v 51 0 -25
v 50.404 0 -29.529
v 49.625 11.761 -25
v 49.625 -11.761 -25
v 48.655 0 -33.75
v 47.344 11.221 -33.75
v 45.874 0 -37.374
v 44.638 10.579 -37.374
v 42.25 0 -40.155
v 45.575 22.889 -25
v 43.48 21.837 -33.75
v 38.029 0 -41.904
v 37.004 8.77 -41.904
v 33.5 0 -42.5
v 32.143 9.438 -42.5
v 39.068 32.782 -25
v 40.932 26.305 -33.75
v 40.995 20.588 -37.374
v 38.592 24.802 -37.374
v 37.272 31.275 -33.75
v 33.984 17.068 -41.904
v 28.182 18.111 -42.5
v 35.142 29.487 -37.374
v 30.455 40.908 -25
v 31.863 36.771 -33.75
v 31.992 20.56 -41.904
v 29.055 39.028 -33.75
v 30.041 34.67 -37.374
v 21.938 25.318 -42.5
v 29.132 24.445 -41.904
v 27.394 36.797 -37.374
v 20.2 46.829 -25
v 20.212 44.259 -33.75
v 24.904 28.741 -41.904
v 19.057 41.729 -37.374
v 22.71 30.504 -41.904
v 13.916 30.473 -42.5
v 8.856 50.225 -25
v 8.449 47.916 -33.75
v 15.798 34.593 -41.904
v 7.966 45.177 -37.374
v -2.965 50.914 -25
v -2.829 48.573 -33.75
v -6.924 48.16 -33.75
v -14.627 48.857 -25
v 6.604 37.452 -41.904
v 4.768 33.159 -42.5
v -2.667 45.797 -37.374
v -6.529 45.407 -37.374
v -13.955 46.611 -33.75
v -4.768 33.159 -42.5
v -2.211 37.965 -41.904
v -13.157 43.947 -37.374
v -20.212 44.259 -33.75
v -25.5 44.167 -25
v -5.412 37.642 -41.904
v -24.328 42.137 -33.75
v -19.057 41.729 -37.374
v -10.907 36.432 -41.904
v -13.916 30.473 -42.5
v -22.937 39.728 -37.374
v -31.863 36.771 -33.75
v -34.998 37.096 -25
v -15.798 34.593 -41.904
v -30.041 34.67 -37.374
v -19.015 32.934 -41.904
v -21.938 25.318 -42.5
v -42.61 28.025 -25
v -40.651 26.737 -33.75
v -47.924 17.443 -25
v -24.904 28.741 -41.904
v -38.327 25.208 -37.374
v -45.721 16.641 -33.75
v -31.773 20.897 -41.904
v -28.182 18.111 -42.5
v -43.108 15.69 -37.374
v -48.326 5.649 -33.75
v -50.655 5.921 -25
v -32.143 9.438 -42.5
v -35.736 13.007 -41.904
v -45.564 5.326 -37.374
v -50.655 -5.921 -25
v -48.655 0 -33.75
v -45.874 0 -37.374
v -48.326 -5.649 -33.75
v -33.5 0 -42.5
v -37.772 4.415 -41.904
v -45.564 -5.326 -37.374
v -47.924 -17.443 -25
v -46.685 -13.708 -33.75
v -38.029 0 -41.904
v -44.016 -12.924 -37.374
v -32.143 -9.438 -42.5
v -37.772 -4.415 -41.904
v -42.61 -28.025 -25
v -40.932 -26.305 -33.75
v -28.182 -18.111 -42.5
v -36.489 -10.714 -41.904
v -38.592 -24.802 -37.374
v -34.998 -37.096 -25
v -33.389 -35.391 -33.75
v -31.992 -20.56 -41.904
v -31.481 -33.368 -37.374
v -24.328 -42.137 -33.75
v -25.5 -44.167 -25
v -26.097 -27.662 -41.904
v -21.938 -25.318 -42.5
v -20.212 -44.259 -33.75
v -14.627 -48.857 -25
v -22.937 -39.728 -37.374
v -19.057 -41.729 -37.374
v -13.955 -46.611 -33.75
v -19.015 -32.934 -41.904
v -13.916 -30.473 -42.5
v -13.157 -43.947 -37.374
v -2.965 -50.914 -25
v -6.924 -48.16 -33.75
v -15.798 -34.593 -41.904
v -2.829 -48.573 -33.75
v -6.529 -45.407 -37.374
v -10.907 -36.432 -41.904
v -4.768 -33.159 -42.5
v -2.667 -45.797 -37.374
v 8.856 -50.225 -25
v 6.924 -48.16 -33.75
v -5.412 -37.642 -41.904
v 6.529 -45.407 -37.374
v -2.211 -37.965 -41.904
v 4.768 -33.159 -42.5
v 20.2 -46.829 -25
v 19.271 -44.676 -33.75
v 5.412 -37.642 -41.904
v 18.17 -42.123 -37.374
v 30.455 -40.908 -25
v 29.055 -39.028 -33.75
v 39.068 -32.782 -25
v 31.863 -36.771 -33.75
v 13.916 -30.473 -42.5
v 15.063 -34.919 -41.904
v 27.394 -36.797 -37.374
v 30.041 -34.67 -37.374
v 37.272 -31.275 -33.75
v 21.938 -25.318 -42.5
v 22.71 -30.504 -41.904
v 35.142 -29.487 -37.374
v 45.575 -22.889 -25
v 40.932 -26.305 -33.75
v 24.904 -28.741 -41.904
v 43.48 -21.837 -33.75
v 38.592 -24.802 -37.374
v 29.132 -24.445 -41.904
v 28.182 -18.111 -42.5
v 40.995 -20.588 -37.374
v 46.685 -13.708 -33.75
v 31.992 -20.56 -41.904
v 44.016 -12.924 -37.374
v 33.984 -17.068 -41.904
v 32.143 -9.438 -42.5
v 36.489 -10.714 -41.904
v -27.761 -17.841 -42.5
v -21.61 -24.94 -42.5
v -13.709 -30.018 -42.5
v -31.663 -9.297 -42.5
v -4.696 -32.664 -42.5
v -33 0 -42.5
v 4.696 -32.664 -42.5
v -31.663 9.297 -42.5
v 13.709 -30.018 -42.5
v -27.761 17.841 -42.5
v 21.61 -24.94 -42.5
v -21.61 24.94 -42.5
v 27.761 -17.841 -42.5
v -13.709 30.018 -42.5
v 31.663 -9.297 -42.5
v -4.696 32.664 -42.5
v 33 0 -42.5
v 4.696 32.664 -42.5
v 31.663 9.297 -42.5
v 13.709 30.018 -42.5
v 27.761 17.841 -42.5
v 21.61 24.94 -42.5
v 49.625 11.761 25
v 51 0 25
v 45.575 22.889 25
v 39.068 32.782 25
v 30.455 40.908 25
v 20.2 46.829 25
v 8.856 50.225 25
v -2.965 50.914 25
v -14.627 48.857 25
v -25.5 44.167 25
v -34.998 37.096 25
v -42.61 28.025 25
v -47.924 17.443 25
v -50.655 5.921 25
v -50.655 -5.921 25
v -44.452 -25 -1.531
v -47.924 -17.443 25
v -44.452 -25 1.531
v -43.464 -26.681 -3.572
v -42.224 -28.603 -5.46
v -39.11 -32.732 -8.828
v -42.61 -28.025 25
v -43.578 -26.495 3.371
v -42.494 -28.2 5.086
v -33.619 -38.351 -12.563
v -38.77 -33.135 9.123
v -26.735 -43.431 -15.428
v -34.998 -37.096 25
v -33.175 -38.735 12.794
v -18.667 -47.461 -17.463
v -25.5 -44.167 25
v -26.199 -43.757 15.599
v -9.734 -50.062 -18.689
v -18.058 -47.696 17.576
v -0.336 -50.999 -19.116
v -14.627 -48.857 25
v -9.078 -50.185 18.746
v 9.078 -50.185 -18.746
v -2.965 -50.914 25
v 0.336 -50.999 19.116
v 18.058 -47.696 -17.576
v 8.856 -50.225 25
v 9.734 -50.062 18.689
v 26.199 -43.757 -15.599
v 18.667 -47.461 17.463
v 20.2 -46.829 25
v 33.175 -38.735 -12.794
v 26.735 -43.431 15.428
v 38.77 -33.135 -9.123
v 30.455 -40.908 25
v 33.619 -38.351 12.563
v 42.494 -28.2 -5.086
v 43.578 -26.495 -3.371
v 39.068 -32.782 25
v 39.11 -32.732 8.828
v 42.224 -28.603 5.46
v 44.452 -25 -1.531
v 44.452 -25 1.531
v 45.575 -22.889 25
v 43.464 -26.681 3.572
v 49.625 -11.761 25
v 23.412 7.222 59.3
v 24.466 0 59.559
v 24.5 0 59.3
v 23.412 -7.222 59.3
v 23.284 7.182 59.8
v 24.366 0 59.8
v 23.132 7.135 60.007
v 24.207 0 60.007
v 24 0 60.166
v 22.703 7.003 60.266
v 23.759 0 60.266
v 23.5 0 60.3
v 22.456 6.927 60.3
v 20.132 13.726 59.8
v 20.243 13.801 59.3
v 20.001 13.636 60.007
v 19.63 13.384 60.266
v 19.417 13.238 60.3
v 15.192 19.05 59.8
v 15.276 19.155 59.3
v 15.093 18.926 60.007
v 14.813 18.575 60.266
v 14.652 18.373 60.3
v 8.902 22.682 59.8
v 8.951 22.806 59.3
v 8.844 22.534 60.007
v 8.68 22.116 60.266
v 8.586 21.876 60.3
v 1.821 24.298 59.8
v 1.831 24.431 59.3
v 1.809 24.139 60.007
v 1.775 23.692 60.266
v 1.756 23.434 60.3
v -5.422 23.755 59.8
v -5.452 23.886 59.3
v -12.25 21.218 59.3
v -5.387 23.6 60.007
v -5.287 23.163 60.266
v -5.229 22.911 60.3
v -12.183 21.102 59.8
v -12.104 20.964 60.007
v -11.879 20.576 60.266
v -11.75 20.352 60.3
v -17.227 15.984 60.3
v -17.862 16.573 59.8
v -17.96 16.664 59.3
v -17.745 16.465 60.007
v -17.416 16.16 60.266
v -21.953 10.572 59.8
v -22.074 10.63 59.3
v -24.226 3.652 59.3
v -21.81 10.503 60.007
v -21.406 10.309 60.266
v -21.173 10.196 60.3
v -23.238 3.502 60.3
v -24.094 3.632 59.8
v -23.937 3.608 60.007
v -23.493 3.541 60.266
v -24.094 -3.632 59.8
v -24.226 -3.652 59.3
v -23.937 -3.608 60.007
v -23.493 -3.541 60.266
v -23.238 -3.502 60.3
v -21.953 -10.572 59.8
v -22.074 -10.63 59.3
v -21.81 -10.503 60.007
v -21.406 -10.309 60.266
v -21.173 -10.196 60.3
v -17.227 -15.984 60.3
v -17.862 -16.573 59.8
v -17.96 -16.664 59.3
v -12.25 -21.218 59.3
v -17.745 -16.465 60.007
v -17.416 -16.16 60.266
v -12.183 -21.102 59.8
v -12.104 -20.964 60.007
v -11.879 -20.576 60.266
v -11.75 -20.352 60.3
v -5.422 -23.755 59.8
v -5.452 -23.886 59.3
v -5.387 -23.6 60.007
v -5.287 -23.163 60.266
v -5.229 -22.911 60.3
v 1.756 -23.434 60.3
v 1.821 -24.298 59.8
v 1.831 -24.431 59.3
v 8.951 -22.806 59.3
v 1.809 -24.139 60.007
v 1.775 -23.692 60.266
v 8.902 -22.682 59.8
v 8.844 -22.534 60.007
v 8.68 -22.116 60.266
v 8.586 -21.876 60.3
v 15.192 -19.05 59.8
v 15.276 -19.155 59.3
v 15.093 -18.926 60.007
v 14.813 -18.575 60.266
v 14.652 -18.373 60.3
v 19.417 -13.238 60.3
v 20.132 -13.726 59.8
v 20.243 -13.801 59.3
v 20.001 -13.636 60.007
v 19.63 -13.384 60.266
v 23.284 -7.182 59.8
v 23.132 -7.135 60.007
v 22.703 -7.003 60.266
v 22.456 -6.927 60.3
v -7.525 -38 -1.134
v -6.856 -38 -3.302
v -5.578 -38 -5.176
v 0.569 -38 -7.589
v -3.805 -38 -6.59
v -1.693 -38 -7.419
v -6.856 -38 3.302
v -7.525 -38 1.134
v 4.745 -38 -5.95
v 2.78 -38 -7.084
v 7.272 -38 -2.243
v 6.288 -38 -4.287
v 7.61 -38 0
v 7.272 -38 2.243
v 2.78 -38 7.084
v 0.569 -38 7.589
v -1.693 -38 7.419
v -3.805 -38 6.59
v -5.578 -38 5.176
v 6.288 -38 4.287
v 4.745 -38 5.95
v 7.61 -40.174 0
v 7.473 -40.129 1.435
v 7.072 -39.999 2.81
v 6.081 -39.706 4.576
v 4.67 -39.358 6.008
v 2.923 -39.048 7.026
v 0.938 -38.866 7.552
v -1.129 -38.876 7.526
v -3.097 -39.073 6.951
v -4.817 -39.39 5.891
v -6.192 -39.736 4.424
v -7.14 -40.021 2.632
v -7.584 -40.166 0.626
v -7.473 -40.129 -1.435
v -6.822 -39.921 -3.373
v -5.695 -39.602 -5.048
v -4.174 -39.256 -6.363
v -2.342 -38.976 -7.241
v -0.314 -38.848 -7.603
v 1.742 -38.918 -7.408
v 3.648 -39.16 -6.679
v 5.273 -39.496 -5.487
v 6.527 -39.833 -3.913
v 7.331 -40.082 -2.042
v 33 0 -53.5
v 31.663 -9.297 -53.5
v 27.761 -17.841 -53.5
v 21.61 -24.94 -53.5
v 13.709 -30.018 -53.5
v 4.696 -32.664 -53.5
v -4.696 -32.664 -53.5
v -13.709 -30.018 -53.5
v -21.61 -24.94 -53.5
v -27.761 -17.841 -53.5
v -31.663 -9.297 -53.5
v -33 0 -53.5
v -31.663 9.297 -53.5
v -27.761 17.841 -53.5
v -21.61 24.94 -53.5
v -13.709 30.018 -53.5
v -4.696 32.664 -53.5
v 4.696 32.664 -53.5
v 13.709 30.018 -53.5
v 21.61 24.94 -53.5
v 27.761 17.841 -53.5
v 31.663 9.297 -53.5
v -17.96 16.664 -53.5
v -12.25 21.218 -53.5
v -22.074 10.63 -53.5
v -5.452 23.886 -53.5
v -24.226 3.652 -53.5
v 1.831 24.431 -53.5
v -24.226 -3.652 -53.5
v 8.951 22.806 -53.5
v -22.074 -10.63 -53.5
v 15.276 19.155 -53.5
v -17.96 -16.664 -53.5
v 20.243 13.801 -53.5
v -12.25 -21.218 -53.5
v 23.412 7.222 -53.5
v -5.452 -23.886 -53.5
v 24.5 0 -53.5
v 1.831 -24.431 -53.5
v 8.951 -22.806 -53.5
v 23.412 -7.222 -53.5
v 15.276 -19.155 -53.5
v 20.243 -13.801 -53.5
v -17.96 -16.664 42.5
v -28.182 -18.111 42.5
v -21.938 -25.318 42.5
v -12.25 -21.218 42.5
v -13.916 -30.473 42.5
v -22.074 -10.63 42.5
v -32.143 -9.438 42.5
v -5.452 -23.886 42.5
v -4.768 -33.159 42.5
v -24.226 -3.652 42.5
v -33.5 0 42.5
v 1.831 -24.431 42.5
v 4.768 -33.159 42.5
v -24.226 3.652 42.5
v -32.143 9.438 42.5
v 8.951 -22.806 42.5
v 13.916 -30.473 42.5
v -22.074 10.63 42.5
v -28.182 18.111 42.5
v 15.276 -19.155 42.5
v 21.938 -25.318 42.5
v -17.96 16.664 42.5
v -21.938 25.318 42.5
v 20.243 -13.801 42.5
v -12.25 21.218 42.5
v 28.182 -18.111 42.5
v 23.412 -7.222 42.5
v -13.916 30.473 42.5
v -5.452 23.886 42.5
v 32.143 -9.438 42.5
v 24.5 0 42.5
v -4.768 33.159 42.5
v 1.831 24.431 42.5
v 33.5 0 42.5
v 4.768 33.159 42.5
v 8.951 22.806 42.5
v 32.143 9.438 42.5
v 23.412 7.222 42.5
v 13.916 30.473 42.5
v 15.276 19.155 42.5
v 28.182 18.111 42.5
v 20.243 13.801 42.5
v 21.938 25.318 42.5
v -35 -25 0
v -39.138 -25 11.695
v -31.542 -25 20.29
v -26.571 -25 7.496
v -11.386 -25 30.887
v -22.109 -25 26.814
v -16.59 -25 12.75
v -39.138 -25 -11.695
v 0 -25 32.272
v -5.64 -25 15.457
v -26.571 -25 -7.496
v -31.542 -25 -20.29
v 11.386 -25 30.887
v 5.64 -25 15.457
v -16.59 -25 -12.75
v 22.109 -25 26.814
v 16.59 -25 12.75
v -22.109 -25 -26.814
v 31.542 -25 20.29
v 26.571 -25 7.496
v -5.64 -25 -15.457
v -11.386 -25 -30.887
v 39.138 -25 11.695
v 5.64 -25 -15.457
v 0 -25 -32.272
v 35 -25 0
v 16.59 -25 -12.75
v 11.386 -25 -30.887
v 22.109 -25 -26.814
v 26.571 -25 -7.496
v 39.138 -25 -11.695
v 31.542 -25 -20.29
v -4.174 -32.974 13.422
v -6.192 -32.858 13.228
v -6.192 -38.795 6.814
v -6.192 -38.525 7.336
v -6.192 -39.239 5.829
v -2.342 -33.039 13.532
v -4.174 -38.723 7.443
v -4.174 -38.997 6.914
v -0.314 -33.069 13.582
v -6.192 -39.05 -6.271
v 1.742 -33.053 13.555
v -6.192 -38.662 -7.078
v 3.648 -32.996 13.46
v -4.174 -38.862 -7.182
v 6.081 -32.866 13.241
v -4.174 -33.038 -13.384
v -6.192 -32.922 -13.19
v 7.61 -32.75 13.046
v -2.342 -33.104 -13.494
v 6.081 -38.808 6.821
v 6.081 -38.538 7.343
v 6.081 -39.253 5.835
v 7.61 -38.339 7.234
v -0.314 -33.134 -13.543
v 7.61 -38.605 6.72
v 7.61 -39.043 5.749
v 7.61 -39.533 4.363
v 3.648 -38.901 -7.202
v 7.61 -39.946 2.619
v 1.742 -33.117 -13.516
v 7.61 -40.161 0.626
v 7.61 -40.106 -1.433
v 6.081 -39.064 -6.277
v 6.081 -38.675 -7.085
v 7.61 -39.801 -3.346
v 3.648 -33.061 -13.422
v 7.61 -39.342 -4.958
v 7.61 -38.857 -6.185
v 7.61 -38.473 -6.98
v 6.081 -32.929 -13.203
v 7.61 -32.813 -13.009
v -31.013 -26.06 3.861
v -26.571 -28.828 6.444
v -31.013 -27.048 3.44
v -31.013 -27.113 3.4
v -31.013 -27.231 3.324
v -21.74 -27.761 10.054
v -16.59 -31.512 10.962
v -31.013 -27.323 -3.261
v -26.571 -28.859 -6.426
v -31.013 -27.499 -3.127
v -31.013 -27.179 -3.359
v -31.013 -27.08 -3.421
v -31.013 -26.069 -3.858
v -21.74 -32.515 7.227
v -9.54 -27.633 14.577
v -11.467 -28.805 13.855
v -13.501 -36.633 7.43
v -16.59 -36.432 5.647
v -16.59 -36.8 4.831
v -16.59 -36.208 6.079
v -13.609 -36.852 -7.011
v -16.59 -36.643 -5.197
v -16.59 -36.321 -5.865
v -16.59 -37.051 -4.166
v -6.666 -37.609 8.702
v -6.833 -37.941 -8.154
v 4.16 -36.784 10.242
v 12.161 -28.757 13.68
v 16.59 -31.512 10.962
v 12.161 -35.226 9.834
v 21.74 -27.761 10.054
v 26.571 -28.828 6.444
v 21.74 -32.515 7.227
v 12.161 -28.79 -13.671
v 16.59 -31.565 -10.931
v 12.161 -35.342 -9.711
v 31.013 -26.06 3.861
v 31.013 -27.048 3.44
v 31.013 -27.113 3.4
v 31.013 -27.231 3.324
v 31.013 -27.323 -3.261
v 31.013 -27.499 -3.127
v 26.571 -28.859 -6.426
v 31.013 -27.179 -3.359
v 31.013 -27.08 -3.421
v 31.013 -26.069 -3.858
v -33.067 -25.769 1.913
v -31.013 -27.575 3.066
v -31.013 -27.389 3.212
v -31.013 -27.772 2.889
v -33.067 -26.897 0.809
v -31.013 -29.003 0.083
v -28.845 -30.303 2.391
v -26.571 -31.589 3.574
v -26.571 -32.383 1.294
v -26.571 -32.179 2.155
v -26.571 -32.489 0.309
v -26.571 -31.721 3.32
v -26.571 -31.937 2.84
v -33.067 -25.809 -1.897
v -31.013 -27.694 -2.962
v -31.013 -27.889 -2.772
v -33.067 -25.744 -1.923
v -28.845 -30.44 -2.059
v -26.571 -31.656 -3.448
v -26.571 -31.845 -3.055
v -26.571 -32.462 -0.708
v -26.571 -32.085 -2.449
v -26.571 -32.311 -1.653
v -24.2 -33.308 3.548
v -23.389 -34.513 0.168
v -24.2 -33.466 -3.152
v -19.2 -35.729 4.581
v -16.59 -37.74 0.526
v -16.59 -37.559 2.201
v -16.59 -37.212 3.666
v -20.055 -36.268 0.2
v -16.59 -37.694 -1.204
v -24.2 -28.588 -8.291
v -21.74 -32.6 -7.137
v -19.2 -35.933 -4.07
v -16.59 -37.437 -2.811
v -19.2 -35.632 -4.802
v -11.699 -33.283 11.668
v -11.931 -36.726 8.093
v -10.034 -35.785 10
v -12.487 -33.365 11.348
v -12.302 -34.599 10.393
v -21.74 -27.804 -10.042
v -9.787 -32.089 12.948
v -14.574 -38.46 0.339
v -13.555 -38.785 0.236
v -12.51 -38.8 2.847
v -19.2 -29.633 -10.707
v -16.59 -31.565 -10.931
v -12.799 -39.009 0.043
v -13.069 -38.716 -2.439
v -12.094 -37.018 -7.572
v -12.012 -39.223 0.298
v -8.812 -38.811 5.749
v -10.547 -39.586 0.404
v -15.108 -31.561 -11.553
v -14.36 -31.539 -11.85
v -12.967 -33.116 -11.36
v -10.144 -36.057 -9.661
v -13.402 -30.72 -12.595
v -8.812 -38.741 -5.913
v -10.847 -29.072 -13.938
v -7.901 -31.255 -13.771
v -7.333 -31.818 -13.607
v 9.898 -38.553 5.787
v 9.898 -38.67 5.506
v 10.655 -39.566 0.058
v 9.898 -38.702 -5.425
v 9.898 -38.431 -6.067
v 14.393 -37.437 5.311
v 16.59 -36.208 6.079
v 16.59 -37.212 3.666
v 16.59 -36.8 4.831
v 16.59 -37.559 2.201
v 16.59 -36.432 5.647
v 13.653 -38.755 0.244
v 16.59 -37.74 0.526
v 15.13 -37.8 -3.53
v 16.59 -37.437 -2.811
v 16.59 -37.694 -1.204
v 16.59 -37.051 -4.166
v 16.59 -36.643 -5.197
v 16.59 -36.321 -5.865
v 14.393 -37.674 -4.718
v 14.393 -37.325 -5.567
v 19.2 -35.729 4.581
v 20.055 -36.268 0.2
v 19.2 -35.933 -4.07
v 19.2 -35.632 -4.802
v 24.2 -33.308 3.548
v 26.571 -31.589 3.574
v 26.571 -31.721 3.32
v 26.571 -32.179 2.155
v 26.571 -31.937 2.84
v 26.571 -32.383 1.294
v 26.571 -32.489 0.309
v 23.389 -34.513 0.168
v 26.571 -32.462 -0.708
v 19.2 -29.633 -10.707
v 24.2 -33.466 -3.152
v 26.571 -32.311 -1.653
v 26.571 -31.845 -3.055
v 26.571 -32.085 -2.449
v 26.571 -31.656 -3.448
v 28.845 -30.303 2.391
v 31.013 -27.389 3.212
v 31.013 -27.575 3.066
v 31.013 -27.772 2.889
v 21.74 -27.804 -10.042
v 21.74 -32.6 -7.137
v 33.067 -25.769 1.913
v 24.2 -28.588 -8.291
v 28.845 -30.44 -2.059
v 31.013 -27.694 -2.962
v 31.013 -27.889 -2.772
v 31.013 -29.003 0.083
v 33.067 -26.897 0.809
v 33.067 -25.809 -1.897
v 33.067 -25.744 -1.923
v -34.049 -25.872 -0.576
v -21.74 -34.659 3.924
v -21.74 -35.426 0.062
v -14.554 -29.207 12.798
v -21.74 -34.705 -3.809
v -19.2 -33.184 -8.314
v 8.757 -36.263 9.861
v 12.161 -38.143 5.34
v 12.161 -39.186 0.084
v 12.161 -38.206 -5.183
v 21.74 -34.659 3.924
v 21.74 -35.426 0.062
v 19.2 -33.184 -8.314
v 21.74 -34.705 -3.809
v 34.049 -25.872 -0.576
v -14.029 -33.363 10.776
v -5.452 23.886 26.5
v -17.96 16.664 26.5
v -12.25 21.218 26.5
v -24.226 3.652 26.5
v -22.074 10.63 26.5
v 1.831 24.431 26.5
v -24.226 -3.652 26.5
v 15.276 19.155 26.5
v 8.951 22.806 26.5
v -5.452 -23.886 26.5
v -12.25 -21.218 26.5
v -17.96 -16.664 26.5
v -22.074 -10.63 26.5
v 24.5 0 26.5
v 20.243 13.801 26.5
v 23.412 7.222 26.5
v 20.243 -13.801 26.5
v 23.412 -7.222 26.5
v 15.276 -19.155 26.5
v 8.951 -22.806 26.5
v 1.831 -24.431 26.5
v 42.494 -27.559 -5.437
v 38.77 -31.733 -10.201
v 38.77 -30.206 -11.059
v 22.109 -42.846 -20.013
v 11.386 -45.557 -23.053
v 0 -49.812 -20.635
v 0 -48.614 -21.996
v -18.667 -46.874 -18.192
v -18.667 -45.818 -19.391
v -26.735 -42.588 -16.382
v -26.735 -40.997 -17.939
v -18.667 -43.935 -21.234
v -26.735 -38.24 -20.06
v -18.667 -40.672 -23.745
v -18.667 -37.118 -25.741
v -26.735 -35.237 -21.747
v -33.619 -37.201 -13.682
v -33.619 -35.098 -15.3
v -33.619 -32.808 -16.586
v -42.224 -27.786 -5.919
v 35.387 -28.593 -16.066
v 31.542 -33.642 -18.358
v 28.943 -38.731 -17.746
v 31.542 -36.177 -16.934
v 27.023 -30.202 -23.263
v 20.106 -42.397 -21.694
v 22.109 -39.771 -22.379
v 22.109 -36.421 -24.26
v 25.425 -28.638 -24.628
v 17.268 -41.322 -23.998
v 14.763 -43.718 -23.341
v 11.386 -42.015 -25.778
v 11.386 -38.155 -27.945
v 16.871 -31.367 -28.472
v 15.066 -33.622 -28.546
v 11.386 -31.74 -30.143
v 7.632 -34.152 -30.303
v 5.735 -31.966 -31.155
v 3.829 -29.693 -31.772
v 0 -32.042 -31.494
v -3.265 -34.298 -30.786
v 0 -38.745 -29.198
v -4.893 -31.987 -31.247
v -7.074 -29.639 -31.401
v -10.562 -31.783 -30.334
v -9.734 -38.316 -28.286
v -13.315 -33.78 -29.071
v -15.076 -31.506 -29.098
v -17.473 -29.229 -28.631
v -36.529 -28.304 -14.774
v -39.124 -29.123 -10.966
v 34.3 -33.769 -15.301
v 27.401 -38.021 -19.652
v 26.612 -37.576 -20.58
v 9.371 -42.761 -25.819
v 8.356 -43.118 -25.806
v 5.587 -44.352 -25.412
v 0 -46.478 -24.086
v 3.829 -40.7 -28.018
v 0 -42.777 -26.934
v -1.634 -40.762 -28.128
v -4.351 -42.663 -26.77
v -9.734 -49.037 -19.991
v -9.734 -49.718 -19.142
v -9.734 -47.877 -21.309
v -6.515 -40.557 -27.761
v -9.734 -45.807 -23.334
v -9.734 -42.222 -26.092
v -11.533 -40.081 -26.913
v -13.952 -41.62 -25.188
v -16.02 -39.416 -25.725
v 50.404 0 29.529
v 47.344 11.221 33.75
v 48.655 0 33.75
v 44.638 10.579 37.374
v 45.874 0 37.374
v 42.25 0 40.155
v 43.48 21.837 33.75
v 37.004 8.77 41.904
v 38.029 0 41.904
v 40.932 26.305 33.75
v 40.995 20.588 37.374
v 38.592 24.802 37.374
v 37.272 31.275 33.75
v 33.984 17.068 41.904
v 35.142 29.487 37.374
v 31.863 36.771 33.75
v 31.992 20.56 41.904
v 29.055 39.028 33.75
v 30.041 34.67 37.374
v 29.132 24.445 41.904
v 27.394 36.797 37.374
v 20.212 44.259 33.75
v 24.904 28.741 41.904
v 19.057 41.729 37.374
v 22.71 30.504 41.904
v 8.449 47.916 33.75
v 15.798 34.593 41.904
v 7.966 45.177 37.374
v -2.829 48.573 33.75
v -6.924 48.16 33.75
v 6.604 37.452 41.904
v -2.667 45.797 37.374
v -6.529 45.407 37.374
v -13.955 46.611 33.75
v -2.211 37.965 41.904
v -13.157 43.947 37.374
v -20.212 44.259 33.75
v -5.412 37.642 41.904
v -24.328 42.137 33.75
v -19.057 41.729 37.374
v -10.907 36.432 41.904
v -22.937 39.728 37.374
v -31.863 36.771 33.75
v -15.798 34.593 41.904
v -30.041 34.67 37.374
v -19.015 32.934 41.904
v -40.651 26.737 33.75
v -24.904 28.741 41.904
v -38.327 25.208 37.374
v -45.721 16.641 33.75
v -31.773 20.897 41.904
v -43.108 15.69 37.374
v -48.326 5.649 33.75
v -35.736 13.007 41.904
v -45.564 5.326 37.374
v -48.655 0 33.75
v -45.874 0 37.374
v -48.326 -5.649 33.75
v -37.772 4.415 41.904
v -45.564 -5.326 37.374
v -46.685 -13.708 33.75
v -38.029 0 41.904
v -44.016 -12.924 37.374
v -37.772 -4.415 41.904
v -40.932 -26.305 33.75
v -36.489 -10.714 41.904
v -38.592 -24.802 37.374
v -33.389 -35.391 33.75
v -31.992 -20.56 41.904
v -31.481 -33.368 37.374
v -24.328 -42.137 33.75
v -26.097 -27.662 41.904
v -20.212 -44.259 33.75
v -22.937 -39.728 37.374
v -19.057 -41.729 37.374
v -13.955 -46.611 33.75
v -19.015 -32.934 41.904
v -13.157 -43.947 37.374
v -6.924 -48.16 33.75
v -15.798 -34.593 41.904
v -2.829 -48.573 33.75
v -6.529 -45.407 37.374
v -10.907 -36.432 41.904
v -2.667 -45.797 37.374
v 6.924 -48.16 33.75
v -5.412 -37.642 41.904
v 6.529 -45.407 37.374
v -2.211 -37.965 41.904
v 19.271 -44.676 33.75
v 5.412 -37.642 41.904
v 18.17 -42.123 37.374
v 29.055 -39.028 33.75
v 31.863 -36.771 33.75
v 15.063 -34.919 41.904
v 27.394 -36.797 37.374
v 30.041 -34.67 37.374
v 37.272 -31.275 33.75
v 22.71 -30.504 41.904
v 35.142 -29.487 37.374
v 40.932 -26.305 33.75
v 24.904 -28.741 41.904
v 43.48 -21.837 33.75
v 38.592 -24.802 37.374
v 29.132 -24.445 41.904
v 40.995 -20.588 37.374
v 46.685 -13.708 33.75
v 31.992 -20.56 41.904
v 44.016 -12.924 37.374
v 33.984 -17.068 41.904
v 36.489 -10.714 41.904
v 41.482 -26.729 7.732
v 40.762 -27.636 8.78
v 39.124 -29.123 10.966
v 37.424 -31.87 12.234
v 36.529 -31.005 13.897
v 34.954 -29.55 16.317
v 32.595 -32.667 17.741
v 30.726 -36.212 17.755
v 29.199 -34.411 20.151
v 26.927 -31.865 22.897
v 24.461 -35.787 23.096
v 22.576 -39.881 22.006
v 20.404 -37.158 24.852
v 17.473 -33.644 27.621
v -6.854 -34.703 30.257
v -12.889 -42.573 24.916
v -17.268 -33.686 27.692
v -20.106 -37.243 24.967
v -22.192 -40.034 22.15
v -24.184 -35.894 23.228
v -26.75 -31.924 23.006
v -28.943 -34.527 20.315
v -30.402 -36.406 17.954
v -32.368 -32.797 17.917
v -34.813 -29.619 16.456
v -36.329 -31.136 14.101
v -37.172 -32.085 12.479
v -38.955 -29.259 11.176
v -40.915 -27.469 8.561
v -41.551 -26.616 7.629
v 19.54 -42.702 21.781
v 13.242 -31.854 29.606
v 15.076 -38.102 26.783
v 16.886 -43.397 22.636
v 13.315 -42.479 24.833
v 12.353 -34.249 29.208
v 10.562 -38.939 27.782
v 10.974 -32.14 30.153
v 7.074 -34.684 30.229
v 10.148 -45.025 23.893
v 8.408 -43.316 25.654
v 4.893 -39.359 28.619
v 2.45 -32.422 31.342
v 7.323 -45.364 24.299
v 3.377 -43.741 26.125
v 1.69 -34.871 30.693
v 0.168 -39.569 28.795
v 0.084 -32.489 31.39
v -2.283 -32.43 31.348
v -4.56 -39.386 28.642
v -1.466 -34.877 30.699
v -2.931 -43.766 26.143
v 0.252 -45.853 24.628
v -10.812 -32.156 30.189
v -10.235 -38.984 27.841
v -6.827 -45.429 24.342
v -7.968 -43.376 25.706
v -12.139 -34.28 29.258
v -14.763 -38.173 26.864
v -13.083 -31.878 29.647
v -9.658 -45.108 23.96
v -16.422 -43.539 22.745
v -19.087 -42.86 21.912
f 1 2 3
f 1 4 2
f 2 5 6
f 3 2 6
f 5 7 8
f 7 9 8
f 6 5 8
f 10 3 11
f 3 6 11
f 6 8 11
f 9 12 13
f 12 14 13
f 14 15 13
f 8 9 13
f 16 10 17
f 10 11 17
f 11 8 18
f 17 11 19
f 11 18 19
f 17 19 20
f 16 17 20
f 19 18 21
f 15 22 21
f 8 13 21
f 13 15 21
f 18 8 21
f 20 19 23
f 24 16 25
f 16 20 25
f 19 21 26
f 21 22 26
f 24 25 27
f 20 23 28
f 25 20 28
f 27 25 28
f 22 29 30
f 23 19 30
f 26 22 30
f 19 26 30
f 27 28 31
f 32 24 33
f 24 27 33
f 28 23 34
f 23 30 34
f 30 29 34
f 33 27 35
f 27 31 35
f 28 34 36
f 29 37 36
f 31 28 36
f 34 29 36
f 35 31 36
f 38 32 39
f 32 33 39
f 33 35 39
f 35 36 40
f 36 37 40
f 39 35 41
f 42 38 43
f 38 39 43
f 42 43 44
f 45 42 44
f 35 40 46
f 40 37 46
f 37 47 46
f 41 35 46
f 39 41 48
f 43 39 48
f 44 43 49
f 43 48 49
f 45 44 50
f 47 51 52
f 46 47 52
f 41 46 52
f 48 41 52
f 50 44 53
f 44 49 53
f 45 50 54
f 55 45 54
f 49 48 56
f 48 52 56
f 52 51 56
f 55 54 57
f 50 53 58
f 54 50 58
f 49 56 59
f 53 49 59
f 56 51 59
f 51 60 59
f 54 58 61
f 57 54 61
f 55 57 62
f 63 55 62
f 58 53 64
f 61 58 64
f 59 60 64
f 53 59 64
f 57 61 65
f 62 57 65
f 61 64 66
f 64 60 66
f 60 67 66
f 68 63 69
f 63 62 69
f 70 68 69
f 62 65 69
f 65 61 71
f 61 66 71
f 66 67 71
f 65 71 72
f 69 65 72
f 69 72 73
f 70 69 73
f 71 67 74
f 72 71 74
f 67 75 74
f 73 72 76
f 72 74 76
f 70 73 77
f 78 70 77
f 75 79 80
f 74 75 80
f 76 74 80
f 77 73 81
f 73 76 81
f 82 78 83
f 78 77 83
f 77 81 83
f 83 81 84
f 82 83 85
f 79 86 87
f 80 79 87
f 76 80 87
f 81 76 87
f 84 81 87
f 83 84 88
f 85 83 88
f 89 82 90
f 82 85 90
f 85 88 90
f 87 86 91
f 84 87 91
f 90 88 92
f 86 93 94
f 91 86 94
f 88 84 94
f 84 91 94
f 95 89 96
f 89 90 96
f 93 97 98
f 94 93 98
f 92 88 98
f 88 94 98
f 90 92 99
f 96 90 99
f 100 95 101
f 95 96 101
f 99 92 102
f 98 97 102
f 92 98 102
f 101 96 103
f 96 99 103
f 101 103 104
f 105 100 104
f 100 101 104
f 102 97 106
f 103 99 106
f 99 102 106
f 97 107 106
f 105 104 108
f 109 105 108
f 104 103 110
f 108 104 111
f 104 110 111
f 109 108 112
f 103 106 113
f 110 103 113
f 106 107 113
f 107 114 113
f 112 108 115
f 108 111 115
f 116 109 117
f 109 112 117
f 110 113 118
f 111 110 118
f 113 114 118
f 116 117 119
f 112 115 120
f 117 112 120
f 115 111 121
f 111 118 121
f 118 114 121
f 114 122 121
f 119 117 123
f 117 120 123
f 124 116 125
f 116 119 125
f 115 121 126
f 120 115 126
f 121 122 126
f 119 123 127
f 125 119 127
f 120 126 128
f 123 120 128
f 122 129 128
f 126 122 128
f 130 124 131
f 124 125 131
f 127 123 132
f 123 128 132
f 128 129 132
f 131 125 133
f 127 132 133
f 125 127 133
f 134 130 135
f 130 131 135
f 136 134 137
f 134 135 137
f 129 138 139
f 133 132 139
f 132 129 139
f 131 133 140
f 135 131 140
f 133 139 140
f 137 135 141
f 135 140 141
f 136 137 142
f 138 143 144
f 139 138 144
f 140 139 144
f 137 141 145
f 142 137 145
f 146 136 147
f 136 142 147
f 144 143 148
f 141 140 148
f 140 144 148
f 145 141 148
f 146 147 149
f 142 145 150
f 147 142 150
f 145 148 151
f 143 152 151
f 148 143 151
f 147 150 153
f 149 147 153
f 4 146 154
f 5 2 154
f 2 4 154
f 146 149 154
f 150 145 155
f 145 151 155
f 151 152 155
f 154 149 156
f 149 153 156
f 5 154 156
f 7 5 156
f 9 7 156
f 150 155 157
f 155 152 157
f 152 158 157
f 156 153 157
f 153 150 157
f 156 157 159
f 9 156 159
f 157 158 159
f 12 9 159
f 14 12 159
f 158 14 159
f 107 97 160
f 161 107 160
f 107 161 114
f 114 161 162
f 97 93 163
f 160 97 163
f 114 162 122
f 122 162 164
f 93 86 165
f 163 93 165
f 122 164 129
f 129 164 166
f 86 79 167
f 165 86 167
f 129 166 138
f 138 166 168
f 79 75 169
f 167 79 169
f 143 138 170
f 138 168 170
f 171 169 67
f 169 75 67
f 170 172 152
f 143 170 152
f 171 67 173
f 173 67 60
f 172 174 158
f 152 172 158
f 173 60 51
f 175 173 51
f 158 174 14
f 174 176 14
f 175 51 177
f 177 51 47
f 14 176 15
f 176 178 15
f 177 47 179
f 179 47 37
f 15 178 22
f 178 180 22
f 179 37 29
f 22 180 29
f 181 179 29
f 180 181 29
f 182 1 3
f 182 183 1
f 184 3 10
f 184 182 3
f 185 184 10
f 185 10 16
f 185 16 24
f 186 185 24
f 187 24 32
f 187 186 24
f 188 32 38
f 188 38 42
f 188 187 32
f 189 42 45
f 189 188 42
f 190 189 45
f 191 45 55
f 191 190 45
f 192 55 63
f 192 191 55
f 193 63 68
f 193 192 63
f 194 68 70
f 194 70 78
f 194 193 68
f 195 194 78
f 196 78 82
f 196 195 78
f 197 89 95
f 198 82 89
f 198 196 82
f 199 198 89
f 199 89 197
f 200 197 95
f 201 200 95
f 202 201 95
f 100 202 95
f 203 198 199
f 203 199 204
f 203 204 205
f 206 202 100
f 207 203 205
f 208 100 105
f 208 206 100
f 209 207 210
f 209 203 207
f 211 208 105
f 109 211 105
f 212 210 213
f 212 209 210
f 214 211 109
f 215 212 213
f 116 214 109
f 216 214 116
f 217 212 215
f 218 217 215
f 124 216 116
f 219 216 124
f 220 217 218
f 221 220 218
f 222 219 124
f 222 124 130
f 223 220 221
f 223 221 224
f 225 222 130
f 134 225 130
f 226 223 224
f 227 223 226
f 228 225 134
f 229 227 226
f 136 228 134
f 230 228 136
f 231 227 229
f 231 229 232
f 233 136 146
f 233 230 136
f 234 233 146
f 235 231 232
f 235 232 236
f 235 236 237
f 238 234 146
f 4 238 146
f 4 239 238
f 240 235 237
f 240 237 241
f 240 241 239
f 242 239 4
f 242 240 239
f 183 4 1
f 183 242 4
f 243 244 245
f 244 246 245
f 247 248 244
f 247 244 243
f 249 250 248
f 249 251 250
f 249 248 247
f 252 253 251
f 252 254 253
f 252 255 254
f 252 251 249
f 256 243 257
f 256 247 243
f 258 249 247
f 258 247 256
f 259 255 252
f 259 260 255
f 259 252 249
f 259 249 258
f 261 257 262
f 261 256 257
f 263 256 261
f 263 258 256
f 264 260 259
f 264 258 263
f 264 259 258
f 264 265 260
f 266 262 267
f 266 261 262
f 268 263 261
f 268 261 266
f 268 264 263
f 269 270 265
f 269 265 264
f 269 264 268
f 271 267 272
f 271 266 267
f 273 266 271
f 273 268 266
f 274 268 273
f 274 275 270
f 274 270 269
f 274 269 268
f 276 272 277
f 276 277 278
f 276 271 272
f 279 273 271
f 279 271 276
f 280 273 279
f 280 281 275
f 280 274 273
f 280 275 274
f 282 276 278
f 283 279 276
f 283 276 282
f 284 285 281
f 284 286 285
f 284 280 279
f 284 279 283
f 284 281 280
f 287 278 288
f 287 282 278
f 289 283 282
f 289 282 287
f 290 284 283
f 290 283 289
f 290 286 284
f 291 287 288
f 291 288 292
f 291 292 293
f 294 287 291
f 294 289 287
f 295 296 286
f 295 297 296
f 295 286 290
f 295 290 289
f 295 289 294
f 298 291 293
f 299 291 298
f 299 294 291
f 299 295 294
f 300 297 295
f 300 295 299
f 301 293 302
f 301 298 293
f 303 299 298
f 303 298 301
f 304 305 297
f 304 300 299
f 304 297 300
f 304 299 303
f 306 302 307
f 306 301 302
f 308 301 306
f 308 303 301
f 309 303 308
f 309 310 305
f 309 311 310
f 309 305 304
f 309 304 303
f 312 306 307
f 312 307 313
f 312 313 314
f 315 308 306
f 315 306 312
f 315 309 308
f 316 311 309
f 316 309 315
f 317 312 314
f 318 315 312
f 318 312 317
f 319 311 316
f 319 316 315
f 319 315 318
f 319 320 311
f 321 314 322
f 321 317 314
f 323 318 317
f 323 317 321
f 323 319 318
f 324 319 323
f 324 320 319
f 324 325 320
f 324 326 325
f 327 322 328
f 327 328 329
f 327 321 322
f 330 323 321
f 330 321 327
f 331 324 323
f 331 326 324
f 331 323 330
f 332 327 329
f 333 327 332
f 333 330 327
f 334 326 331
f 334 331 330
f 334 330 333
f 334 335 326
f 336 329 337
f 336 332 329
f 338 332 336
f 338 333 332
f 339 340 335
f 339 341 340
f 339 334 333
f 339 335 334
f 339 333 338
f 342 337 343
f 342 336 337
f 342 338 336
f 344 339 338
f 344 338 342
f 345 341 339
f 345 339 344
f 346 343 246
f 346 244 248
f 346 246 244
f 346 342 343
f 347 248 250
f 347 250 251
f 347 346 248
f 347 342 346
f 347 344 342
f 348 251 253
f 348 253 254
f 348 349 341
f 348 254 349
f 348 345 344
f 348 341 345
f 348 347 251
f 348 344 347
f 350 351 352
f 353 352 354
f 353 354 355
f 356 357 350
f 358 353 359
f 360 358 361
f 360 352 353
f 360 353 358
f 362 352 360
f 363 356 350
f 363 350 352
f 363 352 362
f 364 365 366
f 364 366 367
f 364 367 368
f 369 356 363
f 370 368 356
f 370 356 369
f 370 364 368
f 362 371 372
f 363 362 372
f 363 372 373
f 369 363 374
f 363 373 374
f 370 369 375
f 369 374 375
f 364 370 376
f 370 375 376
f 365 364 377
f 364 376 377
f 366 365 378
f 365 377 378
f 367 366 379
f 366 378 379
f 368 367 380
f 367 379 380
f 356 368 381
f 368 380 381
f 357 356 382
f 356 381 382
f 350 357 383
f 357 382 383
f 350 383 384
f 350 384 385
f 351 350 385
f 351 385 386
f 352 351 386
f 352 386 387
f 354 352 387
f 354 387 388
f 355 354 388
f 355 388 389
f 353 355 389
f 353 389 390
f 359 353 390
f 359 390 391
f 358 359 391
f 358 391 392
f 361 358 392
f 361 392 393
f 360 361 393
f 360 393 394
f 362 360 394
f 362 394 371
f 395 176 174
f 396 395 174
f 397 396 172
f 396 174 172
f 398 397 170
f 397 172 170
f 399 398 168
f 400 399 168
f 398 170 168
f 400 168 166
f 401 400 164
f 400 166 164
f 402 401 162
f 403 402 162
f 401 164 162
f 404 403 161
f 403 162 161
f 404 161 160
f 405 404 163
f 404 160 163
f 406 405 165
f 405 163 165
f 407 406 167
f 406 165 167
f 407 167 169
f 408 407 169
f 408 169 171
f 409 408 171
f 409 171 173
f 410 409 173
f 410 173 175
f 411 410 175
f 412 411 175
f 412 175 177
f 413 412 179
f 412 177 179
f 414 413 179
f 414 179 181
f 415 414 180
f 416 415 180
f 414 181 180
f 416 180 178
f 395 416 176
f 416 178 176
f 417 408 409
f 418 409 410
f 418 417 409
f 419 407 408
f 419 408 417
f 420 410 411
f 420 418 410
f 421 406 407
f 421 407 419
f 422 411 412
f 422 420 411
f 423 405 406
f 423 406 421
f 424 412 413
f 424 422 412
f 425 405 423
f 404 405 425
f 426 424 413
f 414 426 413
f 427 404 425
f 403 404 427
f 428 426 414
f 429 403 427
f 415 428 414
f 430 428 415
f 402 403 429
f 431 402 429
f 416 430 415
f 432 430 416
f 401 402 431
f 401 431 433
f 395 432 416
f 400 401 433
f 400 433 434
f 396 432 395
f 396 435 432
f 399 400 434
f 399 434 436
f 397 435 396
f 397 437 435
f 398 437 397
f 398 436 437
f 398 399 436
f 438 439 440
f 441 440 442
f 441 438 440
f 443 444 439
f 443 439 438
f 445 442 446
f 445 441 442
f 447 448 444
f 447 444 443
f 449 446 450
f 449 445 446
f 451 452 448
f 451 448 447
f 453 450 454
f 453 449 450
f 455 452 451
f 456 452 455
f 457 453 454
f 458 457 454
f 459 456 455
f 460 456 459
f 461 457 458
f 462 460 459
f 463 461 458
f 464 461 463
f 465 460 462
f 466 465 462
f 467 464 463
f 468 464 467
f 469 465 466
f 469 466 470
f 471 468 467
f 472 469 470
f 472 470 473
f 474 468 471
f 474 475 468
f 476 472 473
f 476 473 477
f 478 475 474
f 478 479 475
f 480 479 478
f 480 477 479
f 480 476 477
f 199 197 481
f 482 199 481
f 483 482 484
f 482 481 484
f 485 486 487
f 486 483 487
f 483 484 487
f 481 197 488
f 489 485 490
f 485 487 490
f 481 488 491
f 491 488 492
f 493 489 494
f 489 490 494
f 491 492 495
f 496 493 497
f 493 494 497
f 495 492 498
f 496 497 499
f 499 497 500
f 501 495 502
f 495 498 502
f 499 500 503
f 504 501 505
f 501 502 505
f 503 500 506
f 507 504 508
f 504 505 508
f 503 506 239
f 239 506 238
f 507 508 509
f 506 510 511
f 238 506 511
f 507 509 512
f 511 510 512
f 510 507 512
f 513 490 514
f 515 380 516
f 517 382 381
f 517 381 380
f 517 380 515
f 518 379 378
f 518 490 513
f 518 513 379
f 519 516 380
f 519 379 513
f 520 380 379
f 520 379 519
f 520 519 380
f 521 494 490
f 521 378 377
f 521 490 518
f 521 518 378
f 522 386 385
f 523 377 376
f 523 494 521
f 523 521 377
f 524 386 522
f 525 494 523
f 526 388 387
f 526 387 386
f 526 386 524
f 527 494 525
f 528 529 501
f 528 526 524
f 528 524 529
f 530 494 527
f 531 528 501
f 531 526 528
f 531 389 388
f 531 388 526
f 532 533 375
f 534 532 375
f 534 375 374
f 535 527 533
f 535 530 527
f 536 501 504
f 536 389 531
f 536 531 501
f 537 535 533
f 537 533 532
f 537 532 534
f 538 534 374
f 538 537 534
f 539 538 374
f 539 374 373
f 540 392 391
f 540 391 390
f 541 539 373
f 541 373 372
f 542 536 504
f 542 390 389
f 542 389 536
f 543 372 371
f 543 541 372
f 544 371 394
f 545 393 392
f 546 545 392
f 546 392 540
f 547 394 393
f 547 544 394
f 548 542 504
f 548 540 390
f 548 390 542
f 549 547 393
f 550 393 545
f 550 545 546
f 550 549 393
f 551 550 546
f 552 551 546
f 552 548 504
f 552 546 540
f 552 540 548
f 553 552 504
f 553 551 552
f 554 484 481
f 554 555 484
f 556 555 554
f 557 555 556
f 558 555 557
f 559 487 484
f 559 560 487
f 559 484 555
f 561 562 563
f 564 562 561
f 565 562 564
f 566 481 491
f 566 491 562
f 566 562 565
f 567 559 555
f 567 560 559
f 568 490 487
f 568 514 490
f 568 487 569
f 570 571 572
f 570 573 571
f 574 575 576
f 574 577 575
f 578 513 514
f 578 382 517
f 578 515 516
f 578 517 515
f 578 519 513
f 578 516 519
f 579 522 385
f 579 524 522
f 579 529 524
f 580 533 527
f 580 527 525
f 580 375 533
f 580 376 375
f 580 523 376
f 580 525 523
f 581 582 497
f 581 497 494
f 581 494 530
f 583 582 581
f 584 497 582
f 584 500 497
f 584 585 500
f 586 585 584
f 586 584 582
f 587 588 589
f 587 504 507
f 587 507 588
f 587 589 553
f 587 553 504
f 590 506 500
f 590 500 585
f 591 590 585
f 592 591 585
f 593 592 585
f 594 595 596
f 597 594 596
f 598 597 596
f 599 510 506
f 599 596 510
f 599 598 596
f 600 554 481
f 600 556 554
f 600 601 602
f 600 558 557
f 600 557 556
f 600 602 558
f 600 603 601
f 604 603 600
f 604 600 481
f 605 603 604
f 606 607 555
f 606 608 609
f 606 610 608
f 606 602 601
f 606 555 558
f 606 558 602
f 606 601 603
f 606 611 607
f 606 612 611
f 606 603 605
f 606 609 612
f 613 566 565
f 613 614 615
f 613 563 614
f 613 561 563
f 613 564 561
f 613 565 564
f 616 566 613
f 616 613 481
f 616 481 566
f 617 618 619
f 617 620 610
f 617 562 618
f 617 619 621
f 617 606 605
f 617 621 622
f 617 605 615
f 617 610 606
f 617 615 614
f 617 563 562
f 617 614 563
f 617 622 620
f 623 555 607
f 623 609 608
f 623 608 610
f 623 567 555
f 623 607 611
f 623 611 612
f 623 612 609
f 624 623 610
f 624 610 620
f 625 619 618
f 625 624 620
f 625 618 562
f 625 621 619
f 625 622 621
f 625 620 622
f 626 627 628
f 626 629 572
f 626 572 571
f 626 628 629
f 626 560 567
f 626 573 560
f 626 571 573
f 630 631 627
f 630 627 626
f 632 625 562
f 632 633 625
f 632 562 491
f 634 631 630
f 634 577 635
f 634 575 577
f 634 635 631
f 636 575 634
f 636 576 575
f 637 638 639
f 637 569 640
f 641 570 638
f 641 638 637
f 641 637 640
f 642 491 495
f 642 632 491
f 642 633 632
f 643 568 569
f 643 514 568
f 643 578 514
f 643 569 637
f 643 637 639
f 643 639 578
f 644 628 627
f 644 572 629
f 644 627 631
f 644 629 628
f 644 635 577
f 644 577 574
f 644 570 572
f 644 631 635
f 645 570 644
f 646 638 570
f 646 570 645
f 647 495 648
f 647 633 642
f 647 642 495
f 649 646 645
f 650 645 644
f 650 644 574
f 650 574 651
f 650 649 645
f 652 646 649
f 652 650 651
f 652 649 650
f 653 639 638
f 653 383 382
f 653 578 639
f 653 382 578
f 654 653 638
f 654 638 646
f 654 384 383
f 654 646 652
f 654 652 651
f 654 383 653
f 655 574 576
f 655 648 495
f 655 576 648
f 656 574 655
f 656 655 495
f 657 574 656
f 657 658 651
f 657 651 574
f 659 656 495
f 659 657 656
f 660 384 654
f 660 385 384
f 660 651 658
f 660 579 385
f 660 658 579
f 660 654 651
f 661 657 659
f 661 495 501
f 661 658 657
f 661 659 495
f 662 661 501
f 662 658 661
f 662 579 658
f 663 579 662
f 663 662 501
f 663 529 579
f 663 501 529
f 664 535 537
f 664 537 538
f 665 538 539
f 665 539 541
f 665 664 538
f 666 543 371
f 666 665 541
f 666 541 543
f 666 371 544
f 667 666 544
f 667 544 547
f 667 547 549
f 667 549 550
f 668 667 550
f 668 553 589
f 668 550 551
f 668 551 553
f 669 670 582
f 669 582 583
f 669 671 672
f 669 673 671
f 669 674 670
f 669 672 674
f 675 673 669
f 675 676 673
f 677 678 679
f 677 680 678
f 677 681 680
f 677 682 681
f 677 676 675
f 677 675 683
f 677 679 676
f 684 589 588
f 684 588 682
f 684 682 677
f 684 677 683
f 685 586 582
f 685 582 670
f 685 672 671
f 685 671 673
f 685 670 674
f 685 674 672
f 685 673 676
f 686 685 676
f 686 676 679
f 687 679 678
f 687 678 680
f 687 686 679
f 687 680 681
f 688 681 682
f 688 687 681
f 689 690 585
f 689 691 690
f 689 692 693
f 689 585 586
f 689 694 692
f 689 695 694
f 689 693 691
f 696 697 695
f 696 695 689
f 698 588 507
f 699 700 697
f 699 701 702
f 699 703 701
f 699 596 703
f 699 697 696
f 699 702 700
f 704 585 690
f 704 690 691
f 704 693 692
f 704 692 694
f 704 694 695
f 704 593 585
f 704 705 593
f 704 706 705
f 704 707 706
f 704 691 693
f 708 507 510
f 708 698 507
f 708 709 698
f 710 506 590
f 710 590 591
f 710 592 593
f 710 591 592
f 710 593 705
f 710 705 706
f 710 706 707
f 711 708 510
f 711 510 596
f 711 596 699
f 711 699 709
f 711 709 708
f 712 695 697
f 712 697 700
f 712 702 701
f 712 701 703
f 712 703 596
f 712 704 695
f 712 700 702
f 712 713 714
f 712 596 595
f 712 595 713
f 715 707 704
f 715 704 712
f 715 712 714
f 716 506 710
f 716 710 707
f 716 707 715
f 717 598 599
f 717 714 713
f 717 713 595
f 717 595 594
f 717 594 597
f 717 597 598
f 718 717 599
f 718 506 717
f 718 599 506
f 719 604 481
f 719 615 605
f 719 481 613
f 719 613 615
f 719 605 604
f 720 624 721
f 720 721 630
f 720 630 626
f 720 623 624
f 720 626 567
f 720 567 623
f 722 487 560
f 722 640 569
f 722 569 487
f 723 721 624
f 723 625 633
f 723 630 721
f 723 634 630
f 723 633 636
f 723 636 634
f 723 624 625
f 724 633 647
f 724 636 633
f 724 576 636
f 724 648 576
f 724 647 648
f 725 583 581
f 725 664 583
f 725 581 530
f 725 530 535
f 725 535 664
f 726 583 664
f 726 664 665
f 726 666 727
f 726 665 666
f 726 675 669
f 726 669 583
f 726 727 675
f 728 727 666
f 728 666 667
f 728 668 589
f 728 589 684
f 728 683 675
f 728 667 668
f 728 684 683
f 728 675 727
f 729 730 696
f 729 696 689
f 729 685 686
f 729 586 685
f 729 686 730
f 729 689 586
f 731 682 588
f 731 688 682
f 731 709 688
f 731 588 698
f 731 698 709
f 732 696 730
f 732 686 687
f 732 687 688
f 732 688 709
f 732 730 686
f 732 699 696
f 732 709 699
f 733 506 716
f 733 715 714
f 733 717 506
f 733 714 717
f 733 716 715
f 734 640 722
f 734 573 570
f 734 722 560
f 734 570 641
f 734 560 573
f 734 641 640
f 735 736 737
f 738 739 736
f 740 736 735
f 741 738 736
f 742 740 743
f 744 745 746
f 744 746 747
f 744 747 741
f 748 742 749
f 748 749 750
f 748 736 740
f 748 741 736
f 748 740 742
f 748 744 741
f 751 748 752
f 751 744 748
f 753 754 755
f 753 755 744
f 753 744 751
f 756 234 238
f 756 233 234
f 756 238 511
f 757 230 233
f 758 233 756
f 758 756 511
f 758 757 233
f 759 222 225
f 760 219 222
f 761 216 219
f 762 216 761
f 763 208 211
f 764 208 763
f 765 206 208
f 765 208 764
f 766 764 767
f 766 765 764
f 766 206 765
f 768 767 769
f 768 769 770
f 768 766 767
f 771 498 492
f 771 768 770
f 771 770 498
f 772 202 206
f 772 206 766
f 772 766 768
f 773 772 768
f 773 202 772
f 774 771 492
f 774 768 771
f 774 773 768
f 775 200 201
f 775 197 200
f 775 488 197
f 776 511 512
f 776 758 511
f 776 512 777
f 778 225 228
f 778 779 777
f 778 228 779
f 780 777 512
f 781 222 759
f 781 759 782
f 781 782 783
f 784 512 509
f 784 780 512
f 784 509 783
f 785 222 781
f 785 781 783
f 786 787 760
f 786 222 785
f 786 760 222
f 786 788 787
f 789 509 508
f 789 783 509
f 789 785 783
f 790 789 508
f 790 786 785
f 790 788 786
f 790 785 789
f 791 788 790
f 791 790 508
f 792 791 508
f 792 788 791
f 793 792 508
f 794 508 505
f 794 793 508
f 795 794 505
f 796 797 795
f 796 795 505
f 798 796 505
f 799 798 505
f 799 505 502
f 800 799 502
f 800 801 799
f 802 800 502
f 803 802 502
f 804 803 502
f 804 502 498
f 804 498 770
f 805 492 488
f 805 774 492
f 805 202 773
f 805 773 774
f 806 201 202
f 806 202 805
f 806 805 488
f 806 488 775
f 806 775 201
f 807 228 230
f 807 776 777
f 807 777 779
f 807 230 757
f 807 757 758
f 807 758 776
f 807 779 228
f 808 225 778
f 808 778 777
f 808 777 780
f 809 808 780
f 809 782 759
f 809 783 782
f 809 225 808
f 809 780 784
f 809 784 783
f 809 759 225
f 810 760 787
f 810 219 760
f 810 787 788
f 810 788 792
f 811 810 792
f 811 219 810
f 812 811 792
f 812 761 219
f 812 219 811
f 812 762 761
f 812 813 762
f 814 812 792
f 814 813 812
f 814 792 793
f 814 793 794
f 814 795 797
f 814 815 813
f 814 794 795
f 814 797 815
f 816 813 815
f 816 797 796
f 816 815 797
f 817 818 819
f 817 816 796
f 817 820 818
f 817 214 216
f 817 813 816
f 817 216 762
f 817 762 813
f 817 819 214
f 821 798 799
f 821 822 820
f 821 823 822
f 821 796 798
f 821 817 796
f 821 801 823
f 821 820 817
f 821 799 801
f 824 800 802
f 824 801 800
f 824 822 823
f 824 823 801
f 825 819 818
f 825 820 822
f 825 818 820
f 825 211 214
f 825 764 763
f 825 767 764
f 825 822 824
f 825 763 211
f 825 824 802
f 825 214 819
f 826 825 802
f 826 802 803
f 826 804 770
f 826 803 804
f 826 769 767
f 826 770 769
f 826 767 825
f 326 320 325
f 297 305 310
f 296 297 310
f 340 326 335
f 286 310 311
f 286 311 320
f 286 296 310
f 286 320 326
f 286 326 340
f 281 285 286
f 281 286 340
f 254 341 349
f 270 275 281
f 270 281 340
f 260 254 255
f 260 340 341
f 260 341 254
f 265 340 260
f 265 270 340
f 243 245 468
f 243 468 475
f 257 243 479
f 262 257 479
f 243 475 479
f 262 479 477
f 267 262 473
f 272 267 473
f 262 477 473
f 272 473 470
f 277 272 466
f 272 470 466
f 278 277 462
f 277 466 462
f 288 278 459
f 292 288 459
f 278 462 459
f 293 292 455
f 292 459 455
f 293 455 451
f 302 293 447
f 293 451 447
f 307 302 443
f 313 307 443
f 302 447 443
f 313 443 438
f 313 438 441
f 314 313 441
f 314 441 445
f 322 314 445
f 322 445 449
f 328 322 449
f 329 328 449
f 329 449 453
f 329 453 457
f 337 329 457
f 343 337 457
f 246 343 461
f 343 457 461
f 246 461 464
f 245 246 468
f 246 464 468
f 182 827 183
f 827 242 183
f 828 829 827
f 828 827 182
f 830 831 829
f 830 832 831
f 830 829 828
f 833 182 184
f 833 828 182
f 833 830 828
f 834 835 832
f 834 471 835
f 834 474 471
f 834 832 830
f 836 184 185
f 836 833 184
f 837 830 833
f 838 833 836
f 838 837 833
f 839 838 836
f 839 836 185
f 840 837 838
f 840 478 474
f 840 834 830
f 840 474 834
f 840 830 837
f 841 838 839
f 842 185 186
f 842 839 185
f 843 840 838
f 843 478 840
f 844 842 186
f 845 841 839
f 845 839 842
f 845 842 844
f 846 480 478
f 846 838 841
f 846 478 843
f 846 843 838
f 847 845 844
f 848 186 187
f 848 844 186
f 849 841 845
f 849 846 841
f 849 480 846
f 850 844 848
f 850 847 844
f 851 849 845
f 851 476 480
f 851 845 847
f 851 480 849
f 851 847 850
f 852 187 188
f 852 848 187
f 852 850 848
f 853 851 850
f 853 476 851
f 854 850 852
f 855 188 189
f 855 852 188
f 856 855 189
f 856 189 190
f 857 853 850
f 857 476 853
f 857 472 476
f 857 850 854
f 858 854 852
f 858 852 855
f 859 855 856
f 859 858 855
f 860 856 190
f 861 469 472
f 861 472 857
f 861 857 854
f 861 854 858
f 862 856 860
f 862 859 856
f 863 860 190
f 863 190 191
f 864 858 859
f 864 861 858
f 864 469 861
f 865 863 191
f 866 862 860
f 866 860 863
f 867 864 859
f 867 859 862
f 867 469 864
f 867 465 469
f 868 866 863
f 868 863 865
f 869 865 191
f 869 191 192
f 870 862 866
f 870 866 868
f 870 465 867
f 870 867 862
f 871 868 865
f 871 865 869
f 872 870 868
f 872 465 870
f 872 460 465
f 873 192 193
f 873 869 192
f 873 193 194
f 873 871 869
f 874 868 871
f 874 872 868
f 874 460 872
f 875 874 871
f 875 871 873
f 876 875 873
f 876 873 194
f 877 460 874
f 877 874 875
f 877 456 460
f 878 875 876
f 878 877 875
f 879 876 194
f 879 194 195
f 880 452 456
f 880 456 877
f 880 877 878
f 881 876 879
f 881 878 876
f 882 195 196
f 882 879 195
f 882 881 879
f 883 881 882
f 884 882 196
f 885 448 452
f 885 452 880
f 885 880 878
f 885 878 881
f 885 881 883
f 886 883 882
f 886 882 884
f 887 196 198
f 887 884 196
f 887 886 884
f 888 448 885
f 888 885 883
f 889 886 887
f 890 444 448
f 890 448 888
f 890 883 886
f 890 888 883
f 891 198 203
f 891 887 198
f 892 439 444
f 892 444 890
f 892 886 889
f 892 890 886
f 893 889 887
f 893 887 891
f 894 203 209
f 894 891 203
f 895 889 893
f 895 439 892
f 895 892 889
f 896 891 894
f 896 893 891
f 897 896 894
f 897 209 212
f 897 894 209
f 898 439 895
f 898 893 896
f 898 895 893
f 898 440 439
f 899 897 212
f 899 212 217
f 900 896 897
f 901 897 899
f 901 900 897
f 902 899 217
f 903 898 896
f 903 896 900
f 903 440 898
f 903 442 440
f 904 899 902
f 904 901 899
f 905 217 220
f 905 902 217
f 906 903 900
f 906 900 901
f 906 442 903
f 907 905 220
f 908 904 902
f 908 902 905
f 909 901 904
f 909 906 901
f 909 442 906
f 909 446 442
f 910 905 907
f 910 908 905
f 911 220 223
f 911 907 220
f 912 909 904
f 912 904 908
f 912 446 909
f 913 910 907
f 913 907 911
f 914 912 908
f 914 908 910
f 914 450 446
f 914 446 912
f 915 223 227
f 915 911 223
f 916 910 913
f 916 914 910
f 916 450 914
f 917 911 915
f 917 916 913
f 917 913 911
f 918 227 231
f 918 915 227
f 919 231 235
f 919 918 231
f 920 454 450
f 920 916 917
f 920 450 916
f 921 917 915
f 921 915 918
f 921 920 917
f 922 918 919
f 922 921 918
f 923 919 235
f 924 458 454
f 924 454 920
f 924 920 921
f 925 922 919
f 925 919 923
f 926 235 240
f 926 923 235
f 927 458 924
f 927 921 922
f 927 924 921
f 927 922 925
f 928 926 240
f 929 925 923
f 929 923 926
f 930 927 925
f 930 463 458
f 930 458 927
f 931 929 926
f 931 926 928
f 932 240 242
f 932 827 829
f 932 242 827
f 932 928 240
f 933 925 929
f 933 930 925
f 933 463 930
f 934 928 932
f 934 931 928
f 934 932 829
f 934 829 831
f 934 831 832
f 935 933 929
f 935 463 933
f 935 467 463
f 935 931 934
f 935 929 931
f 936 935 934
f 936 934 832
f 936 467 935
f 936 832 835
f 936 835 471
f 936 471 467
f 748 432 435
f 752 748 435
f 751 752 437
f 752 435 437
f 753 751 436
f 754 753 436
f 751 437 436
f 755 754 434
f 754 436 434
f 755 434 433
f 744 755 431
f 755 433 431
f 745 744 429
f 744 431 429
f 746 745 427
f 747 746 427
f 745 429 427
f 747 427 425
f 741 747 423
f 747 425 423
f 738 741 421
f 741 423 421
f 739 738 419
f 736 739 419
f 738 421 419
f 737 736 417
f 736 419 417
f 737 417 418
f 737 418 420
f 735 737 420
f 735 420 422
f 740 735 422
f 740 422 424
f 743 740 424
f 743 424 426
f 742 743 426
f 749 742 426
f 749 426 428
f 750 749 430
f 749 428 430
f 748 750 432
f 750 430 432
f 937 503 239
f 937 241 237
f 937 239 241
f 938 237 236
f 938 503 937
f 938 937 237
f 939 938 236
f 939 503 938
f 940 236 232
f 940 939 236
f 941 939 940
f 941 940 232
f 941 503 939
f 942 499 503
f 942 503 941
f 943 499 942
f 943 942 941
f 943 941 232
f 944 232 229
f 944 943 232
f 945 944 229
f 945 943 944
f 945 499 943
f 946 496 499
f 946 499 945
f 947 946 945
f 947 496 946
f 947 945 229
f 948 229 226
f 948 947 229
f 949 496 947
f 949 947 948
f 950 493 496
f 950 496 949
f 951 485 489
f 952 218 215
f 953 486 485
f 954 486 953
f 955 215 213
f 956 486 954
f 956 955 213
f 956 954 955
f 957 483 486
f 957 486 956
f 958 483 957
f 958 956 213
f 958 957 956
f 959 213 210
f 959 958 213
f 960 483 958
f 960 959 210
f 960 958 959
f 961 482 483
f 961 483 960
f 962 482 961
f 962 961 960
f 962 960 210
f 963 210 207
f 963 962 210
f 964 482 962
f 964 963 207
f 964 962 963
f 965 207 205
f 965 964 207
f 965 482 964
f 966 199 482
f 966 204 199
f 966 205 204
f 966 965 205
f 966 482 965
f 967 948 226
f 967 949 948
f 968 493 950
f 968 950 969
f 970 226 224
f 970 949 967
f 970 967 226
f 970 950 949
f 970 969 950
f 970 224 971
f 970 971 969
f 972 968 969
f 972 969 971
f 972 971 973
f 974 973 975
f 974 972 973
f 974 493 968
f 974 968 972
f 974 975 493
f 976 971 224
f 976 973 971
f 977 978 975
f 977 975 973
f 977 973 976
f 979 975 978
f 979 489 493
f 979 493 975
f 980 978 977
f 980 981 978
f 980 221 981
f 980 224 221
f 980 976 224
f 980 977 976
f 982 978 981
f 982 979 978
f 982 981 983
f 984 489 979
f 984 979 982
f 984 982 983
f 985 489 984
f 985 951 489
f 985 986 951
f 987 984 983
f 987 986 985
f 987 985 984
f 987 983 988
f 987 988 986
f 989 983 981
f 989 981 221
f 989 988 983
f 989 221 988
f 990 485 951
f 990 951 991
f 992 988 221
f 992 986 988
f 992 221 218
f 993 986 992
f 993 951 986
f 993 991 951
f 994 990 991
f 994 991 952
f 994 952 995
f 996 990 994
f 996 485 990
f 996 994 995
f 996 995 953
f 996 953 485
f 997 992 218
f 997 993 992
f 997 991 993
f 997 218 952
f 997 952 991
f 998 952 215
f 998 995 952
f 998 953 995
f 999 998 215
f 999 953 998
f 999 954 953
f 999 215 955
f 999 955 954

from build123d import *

# Parameters (mm, degrees)
F0_R      = 51
F1_DEPTH  = 42.5
F2_R      = 17.5
F3_R      = 24.5
F4_DEPTH  = 17.8
F5_R      = 1
F6_DEPTH  = 42.5
F7_R      = 33
F8_DEPTH  = 11
F9_R      = 24.5
F10_DEPTH = 80
F11_R     = 17.5
F17_ANGLE = 180
F19_R     = 7.6099640243
F20_DEPTH = 7
F21_R     = 24.25
F22_DEPTH = 80


with BuildPart() as f1:
    # F0 (on Top) → F1 (new body)
    with BuildSketch(Plane.XY):
        Circle(F0_R)
    extrude(amount=F1_DEPTH)

    # F2
    f2_edges = [f1.edges().sort_by_distance(p)[0] for p in [
        (-51, 0, 42.5),
    ]]
    fillet(f2_edges, radius=F2_R)

    # F3 (on face) → F4 (join)
    with BuildSketch(Plane.XY.offset(42.5)):
        Circle(F3_R)
    extrude(amount=F4_DEPTH)

    # F5
    f5_edges = [f1.edges().sort_by_distance(p)[0] for p in [
        (-24.5, 0, 60.3),
    ]]
    fillet(f5_edges, radius=F5_R)

    # F6 (add): a face of the model
    f6_faces = [f1.faces().sort_by_distance(p)[0] for p in [
        (0, 0, 0),
    ]]
    extrude(f6_faces, amount=F6_DEPTH)

    # F7 (on face) → F8 (join)
    with BuildSketch(Plane(origin=(0, 0, -42.5), x_dir=(1, 0, 0), z_dir=(0, 0, -1))):
        Circle(F7_R)
    extrude(amount=F8_DEPTH)

    # F9 (on face) → F10 (cut)
    with BuildSketch(Plane(origin=(0, 0, -53.5), x_dir=(1, 0, 0), z_dir=(0, 0, -1))):
        Circle(F9_R)
    extrude(amount=-F10_DEPTH, mode=Mode.SUBTRACT)

    # F11
    f11_edges = [f1.edges().sort_by_distance(p)[0] for p in [
        (-51, 0, -42.5),
    ]]
    fillet(f11_edges, radius=F11_R)

    # F16 (on offset) → F17 (revolve, cut)
    with BuildSketch(Plane.XZ.offset(25)):
        with BuildLine():
            Line((35, 0), (45, 0))
            ThreePointArc((45, 0), (0, 32.271534479), (-45, 0))
            Line((-45, 0), (-35, 0))
            ThreePointArc((-35, 0), (0, 15.7988658705), (35, 0))
        make_face()
    revolve(axis=Axis((0, -25, 0), (1, 0, 0)), revolution_arc=F17_ANGLE, mode=Mode.SUBTRACT)


with BuildPart() as f14:
    # F13 (on offset) → F14 (revolve)
    with BuildSketch(Plane.XZ.offset(25)):
        with BuildLine():
            Line((-35, 0), (35, 0))
            ThreePointArc((35, 0), (0, 15.4876255188), (-35, 0))
        make_face()
    revolve(axis=Axis((0, -25, 0), (1, 0, 0)))


with BuildPart() as f20_tool:
    # F19 (on offset) → F20 (new body)
    with BuildSketch(Plane.XZ.offset(45)):
        Circle(F19_R)
    extrude(amount=-F20_DEPTH)


with BuildPart() as f1_1:
    add(f1.part)

    # F20: cut by f20_tool
    add(f20_tool.part, mode=Mode.SUBTRACT)


with BuildPart() as f14_1:
    add(f14.part)

    # F20: cut by f20_tool
    add(f20_tool.part, mode=Mode.SUBTRACT)

    # F21 (on face) → F22 (cut)
    with BuildSketch(Plane(origin=(0, 0, -53.5), x_dir=(1, 0, 0), z_dir=(0, 0, -1))):
        Circle(F21_R)
    extrude(amount=-F22_DEPTH, mode=Mode.SUBTRACT)


solid = f1_1.part
